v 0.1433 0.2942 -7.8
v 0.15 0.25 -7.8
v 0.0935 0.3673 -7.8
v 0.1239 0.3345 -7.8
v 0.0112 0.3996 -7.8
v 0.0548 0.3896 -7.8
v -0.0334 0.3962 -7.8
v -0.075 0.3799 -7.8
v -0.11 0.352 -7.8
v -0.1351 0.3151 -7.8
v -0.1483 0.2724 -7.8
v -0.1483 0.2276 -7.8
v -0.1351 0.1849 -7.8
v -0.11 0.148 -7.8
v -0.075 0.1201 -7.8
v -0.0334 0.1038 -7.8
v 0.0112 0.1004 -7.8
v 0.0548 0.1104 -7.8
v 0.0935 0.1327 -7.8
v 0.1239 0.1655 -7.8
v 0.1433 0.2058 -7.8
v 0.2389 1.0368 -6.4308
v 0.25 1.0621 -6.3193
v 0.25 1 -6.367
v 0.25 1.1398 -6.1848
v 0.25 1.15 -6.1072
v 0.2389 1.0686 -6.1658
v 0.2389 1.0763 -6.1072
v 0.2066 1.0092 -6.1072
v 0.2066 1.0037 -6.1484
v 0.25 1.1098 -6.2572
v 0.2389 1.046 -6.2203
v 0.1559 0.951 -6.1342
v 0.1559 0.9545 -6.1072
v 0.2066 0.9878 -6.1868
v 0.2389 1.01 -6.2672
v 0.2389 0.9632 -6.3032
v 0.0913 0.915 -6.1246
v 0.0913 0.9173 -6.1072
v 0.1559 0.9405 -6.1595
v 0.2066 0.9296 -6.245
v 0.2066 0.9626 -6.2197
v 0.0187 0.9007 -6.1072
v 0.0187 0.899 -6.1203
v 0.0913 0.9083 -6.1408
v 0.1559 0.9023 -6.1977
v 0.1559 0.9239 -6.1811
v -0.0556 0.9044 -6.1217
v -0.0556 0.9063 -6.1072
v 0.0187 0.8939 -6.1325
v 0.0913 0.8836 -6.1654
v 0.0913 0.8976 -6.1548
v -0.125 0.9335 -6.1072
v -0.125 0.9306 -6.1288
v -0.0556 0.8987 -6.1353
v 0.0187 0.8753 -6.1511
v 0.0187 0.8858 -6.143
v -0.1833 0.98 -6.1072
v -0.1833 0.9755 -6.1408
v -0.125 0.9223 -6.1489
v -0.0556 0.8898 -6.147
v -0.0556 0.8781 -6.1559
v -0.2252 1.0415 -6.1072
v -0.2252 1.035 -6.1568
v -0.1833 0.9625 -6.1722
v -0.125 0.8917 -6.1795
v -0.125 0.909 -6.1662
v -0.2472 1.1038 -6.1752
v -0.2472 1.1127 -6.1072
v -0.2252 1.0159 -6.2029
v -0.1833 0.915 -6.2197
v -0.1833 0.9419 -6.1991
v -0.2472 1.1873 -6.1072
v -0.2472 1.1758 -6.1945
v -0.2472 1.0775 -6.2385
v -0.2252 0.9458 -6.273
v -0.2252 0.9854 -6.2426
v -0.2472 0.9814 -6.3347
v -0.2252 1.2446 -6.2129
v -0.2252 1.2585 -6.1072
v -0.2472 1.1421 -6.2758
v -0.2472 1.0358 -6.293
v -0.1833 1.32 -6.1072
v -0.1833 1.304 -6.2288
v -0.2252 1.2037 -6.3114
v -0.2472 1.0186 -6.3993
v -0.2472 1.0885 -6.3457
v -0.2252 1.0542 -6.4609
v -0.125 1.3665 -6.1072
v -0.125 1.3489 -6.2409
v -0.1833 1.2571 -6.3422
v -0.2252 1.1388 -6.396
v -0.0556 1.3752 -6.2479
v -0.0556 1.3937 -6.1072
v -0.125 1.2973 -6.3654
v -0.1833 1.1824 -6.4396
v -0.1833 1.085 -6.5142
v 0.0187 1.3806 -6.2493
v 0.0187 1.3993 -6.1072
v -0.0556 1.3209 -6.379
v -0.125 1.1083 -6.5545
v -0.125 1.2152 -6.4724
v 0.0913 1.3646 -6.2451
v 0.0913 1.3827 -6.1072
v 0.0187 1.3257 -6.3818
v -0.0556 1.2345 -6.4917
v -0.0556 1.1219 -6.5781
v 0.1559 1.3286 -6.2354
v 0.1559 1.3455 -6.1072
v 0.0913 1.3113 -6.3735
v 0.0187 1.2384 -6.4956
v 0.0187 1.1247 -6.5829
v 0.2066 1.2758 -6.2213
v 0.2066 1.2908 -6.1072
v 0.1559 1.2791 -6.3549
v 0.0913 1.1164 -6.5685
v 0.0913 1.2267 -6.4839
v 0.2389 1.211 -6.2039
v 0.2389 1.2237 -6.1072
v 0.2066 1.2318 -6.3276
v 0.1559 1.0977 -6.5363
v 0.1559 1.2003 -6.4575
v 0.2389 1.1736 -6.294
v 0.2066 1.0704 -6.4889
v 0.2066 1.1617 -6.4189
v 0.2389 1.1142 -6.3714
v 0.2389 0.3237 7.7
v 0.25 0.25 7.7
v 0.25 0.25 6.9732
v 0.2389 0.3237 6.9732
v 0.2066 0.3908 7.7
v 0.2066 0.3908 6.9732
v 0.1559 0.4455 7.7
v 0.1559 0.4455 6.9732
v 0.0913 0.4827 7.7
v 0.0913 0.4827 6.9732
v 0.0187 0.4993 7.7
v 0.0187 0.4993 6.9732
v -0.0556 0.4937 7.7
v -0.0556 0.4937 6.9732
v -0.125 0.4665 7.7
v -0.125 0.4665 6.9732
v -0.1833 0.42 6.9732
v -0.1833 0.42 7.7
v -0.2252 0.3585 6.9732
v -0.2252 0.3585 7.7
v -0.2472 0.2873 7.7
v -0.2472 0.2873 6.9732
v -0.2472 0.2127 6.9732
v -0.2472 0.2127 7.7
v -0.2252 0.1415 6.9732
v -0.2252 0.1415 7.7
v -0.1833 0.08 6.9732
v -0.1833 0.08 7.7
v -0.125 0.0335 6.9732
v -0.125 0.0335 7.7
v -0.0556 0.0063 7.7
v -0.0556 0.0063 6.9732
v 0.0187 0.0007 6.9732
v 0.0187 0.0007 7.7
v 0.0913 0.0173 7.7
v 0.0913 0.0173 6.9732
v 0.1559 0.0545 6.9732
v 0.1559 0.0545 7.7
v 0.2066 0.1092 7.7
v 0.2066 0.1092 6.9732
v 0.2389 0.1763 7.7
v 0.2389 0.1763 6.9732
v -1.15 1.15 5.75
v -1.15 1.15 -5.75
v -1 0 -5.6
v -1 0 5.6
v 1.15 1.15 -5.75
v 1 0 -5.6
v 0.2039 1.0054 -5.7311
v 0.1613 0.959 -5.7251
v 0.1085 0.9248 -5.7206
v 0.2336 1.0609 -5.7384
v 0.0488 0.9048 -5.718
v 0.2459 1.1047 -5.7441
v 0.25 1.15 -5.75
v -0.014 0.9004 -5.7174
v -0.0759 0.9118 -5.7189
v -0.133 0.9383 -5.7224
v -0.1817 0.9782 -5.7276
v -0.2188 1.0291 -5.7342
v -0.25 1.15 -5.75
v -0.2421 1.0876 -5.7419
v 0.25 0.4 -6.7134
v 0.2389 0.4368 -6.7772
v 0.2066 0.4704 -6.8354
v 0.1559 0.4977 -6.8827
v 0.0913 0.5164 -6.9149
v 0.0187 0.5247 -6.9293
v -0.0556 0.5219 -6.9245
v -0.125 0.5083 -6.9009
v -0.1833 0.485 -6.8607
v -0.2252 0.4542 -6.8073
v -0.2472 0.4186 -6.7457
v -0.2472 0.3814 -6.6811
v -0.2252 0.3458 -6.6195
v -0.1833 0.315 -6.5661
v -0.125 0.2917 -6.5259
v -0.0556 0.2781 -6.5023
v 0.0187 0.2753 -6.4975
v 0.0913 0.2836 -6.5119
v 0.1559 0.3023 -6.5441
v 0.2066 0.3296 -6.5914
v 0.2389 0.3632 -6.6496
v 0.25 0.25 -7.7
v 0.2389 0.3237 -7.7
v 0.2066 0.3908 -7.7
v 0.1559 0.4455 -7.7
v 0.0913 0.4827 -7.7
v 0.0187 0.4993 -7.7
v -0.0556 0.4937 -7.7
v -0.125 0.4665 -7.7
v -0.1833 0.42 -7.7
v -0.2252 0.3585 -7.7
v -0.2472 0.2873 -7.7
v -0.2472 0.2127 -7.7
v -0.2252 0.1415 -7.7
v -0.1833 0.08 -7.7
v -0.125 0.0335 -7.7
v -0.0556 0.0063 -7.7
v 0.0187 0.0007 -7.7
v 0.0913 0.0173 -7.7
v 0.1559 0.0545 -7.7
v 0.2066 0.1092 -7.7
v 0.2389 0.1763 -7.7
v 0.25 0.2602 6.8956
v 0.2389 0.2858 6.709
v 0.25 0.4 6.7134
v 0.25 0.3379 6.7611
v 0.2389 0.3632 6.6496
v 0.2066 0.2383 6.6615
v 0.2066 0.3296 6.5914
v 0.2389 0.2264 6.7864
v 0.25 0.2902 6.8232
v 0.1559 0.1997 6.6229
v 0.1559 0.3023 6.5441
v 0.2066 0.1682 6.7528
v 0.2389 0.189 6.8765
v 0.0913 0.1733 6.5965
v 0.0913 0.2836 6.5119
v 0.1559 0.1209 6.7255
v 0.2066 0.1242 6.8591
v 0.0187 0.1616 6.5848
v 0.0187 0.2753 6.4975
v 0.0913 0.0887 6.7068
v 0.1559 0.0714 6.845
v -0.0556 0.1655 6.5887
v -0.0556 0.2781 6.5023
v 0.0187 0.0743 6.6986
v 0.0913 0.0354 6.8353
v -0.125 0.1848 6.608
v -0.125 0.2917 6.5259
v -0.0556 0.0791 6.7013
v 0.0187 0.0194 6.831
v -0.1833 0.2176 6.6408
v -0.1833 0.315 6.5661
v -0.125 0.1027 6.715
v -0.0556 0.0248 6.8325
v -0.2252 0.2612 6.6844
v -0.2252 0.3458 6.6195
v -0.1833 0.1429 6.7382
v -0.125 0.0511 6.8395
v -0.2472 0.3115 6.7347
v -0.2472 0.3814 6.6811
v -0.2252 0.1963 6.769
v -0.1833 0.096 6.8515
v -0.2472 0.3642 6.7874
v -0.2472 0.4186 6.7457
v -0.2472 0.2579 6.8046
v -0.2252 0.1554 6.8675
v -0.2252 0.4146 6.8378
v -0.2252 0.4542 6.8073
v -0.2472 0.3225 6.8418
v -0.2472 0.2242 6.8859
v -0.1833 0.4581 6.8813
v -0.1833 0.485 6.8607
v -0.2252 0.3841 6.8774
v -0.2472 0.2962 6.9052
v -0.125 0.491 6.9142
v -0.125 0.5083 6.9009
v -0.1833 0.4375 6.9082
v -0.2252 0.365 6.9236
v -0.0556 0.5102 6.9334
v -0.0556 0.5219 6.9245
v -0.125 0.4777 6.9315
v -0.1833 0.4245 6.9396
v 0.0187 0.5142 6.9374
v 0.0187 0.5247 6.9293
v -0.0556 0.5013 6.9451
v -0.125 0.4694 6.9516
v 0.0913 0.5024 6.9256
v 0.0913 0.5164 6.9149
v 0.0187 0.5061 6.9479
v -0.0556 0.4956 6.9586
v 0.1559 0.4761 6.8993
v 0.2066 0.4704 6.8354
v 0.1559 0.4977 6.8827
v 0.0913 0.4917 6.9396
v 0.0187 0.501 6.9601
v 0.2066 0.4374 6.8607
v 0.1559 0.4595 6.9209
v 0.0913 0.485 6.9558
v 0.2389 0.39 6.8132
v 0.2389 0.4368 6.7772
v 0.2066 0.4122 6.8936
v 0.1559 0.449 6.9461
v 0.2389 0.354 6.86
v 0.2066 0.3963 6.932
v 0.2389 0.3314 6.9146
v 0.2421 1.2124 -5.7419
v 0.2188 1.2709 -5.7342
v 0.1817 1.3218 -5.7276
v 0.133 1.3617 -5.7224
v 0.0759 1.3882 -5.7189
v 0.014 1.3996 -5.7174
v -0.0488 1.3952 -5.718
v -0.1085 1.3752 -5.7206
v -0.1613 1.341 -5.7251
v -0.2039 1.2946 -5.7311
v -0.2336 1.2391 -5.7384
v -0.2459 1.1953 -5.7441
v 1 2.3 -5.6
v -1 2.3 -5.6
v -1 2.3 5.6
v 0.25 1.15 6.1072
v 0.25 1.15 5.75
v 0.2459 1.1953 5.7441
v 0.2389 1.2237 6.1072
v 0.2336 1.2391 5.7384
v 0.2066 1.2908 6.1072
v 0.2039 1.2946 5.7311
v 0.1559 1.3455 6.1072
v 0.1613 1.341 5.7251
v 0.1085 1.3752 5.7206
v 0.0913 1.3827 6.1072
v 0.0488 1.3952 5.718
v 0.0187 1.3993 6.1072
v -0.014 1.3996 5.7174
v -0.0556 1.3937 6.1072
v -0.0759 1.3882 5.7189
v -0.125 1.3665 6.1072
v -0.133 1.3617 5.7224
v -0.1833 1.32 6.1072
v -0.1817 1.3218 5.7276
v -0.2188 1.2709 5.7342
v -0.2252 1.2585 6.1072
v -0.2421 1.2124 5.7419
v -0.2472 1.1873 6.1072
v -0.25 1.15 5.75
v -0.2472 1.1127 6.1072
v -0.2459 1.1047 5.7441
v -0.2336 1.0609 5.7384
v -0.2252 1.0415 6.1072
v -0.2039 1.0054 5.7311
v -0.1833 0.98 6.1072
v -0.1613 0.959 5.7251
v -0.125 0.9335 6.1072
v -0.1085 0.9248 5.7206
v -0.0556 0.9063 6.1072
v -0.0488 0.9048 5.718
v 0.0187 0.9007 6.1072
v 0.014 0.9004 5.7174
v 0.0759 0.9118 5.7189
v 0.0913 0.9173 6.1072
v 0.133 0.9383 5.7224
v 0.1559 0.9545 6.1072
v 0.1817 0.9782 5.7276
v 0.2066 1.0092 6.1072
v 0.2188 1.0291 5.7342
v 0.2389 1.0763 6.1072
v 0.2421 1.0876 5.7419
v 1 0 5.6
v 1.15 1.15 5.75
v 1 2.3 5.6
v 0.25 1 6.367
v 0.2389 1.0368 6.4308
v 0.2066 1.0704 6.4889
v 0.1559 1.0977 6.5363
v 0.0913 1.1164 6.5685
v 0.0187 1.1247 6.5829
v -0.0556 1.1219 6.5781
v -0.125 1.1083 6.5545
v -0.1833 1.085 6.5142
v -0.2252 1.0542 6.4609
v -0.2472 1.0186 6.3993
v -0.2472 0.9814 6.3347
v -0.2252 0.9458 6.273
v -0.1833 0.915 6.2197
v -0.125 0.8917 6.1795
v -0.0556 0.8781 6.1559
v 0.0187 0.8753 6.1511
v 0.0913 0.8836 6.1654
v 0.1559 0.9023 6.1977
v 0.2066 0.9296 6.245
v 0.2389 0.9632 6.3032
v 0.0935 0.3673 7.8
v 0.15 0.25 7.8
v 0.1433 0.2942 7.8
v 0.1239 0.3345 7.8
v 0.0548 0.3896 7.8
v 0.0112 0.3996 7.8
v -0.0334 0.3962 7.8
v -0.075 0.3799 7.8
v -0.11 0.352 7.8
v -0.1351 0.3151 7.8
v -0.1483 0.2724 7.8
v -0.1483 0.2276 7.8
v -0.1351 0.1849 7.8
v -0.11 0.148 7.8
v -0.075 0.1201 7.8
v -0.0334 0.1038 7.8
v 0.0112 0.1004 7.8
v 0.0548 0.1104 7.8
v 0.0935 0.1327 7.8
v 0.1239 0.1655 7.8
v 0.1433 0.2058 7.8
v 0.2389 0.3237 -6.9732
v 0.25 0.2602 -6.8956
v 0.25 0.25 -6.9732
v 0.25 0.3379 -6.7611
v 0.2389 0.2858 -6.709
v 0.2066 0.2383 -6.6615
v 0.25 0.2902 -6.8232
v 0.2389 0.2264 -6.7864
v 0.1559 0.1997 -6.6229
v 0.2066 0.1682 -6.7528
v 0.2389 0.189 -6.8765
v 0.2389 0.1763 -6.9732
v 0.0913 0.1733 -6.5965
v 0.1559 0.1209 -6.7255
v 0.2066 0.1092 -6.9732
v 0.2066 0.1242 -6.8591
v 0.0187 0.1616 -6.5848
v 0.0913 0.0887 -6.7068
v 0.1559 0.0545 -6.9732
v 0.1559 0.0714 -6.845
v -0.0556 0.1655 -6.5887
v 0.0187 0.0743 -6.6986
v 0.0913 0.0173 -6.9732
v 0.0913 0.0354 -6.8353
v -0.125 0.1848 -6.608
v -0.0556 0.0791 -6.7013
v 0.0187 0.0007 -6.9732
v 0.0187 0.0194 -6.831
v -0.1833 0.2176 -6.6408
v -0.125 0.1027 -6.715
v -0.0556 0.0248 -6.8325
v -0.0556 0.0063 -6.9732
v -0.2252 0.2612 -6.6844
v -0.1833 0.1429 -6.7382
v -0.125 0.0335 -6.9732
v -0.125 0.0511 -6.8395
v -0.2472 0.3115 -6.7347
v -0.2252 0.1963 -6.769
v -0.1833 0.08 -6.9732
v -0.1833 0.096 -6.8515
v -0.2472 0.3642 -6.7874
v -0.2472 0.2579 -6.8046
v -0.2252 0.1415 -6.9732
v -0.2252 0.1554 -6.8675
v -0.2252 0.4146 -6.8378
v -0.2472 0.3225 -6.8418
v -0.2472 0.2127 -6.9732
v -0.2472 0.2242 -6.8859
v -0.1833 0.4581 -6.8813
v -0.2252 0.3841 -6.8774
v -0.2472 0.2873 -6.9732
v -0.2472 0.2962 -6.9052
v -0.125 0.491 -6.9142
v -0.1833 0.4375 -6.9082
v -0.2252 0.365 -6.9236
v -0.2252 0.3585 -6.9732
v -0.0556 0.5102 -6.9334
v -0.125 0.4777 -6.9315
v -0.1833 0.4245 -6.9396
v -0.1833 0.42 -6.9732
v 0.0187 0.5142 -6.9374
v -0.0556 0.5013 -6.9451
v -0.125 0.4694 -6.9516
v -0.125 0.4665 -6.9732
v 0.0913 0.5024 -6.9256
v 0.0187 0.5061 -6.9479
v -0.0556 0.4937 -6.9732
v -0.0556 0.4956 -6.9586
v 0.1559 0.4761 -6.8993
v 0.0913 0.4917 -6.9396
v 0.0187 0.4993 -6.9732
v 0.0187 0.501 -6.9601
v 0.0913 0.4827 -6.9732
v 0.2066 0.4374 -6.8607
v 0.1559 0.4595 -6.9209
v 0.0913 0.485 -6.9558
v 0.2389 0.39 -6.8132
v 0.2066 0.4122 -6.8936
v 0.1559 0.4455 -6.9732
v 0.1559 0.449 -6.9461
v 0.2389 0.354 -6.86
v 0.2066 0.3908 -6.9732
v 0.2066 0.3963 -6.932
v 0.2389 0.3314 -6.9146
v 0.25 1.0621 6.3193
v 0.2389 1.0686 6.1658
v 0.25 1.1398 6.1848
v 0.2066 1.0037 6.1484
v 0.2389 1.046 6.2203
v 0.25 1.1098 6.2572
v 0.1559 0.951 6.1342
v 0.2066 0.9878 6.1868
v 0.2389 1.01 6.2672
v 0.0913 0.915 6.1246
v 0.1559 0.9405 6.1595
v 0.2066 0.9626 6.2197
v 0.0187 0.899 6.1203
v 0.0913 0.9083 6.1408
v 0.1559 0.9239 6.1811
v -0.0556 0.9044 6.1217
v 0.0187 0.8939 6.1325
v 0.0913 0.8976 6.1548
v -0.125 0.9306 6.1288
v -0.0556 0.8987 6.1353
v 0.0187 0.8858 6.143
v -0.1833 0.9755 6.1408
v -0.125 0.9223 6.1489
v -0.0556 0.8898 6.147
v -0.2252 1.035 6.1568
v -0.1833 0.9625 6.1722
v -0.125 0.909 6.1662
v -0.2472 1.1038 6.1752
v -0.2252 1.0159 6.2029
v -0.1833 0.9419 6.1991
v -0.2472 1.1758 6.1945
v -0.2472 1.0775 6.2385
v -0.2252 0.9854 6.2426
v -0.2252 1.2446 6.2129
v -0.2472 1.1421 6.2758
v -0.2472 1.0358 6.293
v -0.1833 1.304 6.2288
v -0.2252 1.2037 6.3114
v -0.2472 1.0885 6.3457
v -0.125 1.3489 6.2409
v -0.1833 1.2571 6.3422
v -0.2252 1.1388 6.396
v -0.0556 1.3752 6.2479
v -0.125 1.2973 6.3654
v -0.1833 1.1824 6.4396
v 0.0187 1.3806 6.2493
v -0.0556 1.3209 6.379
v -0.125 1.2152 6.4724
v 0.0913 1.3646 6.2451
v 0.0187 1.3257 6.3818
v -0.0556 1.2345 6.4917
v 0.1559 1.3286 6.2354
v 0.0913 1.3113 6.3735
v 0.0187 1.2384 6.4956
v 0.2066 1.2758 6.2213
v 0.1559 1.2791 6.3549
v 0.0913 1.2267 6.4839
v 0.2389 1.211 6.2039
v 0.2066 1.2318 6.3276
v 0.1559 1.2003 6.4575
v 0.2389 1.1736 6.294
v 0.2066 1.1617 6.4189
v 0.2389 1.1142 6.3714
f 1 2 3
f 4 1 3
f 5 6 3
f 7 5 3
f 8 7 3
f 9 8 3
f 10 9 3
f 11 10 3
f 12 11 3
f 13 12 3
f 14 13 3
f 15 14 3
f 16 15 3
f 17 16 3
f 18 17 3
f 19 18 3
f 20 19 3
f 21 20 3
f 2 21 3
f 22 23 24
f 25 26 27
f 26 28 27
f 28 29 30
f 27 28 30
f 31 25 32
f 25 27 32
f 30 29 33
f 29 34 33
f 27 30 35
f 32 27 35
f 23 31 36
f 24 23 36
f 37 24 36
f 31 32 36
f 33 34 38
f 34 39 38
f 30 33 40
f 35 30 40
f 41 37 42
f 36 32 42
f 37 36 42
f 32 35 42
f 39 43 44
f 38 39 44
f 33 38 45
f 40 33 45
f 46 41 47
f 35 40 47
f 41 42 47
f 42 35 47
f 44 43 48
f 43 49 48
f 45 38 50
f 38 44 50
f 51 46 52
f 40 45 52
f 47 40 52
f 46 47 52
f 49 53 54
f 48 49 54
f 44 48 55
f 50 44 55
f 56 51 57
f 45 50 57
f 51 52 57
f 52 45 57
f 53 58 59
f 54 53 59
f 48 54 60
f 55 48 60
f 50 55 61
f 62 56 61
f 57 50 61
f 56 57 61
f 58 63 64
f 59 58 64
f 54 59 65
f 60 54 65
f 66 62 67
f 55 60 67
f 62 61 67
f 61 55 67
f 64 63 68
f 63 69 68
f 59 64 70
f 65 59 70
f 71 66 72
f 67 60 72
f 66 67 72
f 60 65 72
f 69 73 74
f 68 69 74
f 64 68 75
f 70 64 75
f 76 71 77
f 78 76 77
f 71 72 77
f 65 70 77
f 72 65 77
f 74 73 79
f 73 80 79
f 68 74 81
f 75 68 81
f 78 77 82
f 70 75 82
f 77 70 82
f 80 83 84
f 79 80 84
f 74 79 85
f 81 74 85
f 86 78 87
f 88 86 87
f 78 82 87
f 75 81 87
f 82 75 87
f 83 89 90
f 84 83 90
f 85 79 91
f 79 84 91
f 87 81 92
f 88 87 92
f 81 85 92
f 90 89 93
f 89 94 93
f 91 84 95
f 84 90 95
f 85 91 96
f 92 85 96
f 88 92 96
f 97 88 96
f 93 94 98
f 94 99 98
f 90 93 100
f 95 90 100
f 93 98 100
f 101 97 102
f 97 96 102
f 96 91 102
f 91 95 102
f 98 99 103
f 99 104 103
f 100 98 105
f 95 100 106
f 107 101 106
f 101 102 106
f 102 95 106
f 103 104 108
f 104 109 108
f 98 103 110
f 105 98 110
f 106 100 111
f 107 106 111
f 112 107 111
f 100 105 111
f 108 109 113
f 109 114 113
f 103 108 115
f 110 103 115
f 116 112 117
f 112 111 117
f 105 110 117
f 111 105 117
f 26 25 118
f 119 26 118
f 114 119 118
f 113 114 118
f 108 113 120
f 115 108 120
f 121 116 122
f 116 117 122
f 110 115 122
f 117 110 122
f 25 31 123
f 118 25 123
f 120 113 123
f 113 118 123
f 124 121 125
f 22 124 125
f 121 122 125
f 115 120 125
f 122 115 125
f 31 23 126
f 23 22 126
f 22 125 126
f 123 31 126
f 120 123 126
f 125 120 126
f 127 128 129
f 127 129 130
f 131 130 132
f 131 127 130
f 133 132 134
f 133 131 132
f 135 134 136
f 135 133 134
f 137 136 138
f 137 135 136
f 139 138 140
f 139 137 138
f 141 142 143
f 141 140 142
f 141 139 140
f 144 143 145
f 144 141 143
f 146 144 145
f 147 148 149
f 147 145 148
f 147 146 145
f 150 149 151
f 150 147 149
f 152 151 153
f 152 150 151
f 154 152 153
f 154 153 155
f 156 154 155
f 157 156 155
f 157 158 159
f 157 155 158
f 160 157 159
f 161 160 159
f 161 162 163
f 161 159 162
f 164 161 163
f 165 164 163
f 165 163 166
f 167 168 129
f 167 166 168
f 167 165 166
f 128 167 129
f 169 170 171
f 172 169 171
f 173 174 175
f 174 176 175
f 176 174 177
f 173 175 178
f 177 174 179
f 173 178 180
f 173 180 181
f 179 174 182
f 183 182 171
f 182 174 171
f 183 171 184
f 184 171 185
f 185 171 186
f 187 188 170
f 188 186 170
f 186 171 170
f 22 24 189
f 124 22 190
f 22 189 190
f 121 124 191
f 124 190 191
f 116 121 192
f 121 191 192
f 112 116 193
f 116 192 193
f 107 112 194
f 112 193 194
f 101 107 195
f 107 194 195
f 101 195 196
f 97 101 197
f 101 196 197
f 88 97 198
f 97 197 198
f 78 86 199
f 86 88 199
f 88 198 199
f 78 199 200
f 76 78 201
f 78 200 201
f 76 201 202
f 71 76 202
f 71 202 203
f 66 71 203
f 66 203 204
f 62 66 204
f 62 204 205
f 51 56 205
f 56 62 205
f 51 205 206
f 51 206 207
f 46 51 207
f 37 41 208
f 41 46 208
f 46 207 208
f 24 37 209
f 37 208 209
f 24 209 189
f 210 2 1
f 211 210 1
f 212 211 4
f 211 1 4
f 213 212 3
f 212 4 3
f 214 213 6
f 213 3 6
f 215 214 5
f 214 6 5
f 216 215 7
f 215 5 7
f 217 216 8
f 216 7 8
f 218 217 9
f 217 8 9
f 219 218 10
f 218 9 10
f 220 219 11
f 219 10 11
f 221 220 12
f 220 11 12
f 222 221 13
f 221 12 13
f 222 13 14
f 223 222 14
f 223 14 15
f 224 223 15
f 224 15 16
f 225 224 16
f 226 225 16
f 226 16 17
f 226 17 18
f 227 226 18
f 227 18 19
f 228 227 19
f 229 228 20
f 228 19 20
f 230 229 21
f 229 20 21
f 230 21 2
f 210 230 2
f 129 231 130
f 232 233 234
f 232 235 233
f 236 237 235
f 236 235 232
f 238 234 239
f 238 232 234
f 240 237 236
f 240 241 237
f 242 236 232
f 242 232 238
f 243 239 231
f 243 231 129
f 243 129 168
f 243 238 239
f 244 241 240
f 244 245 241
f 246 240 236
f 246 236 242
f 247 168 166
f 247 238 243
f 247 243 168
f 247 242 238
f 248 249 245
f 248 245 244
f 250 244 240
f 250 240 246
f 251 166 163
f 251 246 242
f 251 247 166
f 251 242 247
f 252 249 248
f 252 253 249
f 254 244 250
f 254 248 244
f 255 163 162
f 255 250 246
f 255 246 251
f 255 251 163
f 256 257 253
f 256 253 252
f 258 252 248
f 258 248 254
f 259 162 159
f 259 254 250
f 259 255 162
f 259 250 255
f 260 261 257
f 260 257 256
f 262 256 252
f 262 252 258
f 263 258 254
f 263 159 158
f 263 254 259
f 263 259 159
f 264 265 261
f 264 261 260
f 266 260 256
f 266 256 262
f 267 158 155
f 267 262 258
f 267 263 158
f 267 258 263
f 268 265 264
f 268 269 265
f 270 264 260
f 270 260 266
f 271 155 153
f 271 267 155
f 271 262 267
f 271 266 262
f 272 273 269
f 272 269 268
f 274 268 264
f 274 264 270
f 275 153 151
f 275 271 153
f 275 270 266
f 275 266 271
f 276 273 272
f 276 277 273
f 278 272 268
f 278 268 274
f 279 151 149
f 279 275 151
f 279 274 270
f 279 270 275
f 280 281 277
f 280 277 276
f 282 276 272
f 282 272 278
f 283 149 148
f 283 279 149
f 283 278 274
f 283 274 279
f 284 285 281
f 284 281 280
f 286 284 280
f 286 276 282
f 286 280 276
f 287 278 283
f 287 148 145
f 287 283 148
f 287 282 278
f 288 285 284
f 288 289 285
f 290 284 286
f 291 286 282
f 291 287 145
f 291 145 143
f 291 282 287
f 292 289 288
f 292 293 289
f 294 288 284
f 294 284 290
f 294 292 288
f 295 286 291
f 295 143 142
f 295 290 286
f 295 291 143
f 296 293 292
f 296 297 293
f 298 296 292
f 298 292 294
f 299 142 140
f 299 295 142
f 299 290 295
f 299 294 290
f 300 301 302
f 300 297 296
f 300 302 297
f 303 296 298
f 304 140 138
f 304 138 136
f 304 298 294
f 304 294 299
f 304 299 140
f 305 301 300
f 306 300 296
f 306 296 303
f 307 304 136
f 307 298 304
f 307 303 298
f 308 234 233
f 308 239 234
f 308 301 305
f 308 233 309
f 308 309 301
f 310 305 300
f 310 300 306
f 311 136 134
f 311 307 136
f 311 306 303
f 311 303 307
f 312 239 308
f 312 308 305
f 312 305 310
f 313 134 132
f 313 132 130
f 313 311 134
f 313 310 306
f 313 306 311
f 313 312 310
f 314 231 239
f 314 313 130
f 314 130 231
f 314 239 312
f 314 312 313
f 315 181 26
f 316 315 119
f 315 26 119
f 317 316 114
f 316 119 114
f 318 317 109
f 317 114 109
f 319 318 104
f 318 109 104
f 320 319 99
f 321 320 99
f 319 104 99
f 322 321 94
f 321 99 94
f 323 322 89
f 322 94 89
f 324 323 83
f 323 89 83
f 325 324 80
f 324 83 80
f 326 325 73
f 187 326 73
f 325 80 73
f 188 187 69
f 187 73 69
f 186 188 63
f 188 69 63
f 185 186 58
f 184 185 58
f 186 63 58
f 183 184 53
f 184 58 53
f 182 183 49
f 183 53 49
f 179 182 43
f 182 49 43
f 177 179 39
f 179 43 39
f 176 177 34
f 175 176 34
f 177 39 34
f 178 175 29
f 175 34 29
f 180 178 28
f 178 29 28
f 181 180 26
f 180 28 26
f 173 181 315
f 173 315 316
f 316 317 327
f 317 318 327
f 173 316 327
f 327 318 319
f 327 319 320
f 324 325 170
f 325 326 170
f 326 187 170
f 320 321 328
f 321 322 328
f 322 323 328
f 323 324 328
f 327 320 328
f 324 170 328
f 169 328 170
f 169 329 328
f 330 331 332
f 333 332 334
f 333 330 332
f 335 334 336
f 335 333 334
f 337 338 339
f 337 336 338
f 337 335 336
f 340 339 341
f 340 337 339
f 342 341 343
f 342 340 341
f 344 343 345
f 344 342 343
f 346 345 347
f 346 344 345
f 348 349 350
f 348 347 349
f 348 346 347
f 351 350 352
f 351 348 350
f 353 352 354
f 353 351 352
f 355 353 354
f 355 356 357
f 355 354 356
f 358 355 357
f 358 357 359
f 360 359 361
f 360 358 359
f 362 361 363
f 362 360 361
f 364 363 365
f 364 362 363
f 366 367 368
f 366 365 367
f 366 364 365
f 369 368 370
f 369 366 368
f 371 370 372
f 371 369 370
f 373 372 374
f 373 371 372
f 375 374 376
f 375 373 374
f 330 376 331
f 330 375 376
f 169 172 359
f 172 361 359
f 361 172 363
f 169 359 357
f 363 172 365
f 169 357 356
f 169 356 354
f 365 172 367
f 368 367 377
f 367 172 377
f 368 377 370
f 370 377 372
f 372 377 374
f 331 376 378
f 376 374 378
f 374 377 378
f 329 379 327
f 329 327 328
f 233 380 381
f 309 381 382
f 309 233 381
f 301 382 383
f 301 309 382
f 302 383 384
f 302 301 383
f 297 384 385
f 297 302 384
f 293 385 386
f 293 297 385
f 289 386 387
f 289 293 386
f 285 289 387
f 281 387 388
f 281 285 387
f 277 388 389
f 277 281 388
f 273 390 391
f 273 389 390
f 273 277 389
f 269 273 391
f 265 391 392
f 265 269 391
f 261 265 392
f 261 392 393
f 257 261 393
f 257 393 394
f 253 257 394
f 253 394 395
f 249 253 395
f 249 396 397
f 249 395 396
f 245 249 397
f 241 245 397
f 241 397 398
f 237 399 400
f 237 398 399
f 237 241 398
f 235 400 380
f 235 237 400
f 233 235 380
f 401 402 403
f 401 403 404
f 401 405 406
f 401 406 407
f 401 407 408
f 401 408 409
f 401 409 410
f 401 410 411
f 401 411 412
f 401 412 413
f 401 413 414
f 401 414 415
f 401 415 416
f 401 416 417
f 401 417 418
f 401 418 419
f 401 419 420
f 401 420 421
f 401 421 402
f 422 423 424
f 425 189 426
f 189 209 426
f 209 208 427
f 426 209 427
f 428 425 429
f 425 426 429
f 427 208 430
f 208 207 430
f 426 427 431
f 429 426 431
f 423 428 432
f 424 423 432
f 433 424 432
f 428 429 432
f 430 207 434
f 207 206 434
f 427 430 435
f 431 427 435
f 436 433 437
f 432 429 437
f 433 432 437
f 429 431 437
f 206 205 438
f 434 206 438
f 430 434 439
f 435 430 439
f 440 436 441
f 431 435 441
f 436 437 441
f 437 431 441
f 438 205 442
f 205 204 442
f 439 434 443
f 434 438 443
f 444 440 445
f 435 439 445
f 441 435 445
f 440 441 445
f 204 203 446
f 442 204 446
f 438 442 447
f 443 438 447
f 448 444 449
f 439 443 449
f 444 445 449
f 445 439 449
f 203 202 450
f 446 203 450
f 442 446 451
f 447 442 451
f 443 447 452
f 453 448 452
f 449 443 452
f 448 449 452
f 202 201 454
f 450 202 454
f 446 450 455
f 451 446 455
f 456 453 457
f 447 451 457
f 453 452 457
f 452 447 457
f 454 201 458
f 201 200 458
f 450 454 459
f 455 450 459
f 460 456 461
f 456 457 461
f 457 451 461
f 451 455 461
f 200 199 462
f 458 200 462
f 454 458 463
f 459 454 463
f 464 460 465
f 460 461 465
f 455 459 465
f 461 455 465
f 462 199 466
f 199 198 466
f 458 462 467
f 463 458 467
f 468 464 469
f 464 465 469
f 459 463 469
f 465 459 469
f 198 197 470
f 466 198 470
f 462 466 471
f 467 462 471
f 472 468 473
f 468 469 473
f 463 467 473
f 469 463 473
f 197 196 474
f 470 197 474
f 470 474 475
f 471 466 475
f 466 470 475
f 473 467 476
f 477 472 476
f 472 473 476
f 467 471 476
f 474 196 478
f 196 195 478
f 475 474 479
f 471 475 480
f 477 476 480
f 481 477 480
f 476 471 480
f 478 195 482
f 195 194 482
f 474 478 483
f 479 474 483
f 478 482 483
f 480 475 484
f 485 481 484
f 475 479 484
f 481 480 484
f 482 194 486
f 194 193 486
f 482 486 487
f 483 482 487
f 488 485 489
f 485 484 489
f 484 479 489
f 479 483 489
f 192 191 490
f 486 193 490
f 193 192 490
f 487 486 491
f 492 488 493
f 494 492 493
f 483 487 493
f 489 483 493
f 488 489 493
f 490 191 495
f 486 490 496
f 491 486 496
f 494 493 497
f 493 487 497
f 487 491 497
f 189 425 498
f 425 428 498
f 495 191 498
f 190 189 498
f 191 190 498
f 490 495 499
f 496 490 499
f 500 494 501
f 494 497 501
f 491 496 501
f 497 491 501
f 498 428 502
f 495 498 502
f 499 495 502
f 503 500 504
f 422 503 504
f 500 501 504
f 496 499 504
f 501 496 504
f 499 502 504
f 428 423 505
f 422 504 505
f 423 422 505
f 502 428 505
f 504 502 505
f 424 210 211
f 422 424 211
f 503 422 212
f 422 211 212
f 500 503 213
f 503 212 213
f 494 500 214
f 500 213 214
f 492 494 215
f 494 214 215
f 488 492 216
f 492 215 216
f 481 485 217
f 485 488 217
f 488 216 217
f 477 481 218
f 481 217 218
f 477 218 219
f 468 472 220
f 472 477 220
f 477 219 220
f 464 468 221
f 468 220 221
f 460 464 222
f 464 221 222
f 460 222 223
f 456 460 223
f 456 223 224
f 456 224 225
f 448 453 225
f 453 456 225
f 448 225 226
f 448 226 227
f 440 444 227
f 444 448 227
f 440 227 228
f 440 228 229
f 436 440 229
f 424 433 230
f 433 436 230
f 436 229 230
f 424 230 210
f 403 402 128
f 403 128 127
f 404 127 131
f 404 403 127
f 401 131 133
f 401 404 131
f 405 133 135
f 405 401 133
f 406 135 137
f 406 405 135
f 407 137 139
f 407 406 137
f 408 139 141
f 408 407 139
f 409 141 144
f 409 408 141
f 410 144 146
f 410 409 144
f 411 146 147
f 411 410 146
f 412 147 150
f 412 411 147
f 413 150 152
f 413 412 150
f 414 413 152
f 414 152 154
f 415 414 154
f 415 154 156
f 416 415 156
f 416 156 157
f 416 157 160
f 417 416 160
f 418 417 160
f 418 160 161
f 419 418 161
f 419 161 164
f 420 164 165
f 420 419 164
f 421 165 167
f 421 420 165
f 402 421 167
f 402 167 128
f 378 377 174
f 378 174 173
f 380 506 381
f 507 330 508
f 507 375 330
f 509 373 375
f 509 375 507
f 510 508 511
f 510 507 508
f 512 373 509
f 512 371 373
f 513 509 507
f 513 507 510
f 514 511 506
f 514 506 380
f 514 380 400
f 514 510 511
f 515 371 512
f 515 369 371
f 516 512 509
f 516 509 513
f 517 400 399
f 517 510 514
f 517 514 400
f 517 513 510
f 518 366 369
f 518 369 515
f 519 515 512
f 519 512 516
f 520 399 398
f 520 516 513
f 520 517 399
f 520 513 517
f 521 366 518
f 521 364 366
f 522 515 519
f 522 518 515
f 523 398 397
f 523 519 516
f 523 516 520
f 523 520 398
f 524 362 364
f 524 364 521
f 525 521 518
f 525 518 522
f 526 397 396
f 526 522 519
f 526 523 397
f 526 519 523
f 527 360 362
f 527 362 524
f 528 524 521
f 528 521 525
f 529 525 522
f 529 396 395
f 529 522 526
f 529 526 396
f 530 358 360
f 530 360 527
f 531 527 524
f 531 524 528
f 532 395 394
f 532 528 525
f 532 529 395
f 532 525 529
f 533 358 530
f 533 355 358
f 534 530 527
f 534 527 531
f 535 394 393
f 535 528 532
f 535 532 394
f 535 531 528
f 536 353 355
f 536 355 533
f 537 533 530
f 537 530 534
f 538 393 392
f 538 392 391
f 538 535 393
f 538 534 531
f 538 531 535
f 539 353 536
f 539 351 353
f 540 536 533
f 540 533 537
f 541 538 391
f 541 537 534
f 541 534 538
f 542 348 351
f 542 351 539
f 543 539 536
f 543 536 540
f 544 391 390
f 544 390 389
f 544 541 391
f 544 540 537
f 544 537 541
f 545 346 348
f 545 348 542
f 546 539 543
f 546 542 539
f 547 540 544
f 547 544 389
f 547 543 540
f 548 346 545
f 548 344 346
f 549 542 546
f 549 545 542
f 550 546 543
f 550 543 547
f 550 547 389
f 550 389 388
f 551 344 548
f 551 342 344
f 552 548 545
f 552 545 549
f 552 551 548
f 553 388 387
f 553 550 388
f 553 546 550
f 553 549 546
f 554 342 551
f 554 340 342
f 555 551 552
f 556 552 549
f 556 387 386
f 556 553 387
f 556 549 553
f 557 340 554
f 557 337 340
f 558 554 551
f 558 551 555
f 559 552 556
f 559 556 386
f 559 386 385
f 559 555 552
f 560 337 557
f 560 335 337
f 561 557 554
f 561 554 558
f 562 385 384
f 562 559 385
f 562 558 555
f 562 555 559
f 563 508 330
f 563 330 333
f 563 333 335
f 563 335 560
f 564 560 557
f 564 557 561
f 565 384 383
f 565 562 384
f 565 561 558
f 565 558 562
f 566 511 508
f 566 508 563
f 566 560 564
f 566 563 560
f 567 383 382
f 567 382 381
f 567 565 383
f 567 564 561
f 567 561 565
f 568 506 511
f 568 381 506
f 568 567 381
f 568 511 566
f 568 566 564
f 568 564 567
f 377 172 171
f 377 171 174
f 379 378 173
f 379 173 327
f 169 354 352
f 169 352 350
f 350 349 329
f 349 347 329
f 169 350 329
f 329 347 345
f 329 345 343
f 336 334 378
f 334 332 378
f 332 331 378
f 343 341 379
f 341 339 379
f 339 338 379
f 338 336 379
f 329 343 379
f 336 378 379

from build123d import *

# Parameters (mm, degrees)
BOSS_EXTRUDE1_DEPTH     = 5.75
CUT_EXTRUDE1_DEPTH      = 2.15
CUT_EXTRUDE1_DEPTH_BACK = 11
SKETCH4_R               = 0.25
CHAMFER1_SIZE           = 0.1


with BuildPart() as part:
    # Sketch1 → Boss-Extrude1 (new body, symmetric)
    with BuildSketch(Plane.XY):
        Polygon((-1, 0), (1, 0), (1.15, 1.15), (1, 2.3), (-1, 2.3), (-1.15, 1.15), align=None)
    extrude(amount=BOSS_EXTRUDE1_DEPTH, both=True)

    # Sketch2 → Cut-Extrude1 (cut, two sides)
    with BuildSketch(Plane(origin=(0, 0, 0), x_dir=(0, 0, -1), z_dir=(1, 0, 0))) as cut_extrude1_sk:
        Polygon((5.75, 1.15), (5.6, 2.3), (6.6, 2.3), (6.6, 0), (5.6, 0), align=None)
        Polygon((-5.6, 0), (-5.75, 1.15), (-5.6, 2.3), (-6.6, 2.3), (-6.6, 0), align=None)
    extrude(amount=CUT_EXTRUDE1_DEPTH, mode=Mode.SUBTRACT)
    extrude(cut_extrude1_sk.sketch, amount=-CUT_EXTRUDE1_DEPTH_BACK, mode=Mode.SUBTRACT)

    # Sweep1: sweep along a path in Sketch5
    with BuildLine(Plane(origin=(0, 0, 0), x_dir=(0, 0, -1), z_dir=(1, 0, 0))) as sweep1_path:
        Line((-5, 1.15), (-6.107179677, 1.15))
        ThreePointArc((-6.107179677, 1.15), (-6.257179677, 1.109807621), (-6.366987298, 1))
        Line((-6.366987298, 1), (-6.71339746, 0.4))
        ThreePointArc((-6.71339746, 0.4), (-6.823205081, 0.290192379), (-6.973205081, 0.25))
        Line((-6.973205081, 0.25), (-7.8, 0.25))
    # Sketch4 → Sweep1 (sweep)
    with BuildSketch(Plane.XY.offset(5)):
        with Locations((0, 1.15)):
            Circle(SKETCH4_R)
    sweep1 = sweep(path=sweep1_path.line)

    # Mirror1: Sweep1 across plane
    add(sweep1.mirror(Plane.XY))

    # Chamfer1
    chamfer1_edges = [part.edges().sort_by_distance(p)[0] for p in [
        (-0.25, 0.25, 7.8),
        (-0.25, 0.25, -7.8),
    ]]
    chamfer(chamfer1_edges, length=CHAMFER1_SIZE)


solid = part.part
